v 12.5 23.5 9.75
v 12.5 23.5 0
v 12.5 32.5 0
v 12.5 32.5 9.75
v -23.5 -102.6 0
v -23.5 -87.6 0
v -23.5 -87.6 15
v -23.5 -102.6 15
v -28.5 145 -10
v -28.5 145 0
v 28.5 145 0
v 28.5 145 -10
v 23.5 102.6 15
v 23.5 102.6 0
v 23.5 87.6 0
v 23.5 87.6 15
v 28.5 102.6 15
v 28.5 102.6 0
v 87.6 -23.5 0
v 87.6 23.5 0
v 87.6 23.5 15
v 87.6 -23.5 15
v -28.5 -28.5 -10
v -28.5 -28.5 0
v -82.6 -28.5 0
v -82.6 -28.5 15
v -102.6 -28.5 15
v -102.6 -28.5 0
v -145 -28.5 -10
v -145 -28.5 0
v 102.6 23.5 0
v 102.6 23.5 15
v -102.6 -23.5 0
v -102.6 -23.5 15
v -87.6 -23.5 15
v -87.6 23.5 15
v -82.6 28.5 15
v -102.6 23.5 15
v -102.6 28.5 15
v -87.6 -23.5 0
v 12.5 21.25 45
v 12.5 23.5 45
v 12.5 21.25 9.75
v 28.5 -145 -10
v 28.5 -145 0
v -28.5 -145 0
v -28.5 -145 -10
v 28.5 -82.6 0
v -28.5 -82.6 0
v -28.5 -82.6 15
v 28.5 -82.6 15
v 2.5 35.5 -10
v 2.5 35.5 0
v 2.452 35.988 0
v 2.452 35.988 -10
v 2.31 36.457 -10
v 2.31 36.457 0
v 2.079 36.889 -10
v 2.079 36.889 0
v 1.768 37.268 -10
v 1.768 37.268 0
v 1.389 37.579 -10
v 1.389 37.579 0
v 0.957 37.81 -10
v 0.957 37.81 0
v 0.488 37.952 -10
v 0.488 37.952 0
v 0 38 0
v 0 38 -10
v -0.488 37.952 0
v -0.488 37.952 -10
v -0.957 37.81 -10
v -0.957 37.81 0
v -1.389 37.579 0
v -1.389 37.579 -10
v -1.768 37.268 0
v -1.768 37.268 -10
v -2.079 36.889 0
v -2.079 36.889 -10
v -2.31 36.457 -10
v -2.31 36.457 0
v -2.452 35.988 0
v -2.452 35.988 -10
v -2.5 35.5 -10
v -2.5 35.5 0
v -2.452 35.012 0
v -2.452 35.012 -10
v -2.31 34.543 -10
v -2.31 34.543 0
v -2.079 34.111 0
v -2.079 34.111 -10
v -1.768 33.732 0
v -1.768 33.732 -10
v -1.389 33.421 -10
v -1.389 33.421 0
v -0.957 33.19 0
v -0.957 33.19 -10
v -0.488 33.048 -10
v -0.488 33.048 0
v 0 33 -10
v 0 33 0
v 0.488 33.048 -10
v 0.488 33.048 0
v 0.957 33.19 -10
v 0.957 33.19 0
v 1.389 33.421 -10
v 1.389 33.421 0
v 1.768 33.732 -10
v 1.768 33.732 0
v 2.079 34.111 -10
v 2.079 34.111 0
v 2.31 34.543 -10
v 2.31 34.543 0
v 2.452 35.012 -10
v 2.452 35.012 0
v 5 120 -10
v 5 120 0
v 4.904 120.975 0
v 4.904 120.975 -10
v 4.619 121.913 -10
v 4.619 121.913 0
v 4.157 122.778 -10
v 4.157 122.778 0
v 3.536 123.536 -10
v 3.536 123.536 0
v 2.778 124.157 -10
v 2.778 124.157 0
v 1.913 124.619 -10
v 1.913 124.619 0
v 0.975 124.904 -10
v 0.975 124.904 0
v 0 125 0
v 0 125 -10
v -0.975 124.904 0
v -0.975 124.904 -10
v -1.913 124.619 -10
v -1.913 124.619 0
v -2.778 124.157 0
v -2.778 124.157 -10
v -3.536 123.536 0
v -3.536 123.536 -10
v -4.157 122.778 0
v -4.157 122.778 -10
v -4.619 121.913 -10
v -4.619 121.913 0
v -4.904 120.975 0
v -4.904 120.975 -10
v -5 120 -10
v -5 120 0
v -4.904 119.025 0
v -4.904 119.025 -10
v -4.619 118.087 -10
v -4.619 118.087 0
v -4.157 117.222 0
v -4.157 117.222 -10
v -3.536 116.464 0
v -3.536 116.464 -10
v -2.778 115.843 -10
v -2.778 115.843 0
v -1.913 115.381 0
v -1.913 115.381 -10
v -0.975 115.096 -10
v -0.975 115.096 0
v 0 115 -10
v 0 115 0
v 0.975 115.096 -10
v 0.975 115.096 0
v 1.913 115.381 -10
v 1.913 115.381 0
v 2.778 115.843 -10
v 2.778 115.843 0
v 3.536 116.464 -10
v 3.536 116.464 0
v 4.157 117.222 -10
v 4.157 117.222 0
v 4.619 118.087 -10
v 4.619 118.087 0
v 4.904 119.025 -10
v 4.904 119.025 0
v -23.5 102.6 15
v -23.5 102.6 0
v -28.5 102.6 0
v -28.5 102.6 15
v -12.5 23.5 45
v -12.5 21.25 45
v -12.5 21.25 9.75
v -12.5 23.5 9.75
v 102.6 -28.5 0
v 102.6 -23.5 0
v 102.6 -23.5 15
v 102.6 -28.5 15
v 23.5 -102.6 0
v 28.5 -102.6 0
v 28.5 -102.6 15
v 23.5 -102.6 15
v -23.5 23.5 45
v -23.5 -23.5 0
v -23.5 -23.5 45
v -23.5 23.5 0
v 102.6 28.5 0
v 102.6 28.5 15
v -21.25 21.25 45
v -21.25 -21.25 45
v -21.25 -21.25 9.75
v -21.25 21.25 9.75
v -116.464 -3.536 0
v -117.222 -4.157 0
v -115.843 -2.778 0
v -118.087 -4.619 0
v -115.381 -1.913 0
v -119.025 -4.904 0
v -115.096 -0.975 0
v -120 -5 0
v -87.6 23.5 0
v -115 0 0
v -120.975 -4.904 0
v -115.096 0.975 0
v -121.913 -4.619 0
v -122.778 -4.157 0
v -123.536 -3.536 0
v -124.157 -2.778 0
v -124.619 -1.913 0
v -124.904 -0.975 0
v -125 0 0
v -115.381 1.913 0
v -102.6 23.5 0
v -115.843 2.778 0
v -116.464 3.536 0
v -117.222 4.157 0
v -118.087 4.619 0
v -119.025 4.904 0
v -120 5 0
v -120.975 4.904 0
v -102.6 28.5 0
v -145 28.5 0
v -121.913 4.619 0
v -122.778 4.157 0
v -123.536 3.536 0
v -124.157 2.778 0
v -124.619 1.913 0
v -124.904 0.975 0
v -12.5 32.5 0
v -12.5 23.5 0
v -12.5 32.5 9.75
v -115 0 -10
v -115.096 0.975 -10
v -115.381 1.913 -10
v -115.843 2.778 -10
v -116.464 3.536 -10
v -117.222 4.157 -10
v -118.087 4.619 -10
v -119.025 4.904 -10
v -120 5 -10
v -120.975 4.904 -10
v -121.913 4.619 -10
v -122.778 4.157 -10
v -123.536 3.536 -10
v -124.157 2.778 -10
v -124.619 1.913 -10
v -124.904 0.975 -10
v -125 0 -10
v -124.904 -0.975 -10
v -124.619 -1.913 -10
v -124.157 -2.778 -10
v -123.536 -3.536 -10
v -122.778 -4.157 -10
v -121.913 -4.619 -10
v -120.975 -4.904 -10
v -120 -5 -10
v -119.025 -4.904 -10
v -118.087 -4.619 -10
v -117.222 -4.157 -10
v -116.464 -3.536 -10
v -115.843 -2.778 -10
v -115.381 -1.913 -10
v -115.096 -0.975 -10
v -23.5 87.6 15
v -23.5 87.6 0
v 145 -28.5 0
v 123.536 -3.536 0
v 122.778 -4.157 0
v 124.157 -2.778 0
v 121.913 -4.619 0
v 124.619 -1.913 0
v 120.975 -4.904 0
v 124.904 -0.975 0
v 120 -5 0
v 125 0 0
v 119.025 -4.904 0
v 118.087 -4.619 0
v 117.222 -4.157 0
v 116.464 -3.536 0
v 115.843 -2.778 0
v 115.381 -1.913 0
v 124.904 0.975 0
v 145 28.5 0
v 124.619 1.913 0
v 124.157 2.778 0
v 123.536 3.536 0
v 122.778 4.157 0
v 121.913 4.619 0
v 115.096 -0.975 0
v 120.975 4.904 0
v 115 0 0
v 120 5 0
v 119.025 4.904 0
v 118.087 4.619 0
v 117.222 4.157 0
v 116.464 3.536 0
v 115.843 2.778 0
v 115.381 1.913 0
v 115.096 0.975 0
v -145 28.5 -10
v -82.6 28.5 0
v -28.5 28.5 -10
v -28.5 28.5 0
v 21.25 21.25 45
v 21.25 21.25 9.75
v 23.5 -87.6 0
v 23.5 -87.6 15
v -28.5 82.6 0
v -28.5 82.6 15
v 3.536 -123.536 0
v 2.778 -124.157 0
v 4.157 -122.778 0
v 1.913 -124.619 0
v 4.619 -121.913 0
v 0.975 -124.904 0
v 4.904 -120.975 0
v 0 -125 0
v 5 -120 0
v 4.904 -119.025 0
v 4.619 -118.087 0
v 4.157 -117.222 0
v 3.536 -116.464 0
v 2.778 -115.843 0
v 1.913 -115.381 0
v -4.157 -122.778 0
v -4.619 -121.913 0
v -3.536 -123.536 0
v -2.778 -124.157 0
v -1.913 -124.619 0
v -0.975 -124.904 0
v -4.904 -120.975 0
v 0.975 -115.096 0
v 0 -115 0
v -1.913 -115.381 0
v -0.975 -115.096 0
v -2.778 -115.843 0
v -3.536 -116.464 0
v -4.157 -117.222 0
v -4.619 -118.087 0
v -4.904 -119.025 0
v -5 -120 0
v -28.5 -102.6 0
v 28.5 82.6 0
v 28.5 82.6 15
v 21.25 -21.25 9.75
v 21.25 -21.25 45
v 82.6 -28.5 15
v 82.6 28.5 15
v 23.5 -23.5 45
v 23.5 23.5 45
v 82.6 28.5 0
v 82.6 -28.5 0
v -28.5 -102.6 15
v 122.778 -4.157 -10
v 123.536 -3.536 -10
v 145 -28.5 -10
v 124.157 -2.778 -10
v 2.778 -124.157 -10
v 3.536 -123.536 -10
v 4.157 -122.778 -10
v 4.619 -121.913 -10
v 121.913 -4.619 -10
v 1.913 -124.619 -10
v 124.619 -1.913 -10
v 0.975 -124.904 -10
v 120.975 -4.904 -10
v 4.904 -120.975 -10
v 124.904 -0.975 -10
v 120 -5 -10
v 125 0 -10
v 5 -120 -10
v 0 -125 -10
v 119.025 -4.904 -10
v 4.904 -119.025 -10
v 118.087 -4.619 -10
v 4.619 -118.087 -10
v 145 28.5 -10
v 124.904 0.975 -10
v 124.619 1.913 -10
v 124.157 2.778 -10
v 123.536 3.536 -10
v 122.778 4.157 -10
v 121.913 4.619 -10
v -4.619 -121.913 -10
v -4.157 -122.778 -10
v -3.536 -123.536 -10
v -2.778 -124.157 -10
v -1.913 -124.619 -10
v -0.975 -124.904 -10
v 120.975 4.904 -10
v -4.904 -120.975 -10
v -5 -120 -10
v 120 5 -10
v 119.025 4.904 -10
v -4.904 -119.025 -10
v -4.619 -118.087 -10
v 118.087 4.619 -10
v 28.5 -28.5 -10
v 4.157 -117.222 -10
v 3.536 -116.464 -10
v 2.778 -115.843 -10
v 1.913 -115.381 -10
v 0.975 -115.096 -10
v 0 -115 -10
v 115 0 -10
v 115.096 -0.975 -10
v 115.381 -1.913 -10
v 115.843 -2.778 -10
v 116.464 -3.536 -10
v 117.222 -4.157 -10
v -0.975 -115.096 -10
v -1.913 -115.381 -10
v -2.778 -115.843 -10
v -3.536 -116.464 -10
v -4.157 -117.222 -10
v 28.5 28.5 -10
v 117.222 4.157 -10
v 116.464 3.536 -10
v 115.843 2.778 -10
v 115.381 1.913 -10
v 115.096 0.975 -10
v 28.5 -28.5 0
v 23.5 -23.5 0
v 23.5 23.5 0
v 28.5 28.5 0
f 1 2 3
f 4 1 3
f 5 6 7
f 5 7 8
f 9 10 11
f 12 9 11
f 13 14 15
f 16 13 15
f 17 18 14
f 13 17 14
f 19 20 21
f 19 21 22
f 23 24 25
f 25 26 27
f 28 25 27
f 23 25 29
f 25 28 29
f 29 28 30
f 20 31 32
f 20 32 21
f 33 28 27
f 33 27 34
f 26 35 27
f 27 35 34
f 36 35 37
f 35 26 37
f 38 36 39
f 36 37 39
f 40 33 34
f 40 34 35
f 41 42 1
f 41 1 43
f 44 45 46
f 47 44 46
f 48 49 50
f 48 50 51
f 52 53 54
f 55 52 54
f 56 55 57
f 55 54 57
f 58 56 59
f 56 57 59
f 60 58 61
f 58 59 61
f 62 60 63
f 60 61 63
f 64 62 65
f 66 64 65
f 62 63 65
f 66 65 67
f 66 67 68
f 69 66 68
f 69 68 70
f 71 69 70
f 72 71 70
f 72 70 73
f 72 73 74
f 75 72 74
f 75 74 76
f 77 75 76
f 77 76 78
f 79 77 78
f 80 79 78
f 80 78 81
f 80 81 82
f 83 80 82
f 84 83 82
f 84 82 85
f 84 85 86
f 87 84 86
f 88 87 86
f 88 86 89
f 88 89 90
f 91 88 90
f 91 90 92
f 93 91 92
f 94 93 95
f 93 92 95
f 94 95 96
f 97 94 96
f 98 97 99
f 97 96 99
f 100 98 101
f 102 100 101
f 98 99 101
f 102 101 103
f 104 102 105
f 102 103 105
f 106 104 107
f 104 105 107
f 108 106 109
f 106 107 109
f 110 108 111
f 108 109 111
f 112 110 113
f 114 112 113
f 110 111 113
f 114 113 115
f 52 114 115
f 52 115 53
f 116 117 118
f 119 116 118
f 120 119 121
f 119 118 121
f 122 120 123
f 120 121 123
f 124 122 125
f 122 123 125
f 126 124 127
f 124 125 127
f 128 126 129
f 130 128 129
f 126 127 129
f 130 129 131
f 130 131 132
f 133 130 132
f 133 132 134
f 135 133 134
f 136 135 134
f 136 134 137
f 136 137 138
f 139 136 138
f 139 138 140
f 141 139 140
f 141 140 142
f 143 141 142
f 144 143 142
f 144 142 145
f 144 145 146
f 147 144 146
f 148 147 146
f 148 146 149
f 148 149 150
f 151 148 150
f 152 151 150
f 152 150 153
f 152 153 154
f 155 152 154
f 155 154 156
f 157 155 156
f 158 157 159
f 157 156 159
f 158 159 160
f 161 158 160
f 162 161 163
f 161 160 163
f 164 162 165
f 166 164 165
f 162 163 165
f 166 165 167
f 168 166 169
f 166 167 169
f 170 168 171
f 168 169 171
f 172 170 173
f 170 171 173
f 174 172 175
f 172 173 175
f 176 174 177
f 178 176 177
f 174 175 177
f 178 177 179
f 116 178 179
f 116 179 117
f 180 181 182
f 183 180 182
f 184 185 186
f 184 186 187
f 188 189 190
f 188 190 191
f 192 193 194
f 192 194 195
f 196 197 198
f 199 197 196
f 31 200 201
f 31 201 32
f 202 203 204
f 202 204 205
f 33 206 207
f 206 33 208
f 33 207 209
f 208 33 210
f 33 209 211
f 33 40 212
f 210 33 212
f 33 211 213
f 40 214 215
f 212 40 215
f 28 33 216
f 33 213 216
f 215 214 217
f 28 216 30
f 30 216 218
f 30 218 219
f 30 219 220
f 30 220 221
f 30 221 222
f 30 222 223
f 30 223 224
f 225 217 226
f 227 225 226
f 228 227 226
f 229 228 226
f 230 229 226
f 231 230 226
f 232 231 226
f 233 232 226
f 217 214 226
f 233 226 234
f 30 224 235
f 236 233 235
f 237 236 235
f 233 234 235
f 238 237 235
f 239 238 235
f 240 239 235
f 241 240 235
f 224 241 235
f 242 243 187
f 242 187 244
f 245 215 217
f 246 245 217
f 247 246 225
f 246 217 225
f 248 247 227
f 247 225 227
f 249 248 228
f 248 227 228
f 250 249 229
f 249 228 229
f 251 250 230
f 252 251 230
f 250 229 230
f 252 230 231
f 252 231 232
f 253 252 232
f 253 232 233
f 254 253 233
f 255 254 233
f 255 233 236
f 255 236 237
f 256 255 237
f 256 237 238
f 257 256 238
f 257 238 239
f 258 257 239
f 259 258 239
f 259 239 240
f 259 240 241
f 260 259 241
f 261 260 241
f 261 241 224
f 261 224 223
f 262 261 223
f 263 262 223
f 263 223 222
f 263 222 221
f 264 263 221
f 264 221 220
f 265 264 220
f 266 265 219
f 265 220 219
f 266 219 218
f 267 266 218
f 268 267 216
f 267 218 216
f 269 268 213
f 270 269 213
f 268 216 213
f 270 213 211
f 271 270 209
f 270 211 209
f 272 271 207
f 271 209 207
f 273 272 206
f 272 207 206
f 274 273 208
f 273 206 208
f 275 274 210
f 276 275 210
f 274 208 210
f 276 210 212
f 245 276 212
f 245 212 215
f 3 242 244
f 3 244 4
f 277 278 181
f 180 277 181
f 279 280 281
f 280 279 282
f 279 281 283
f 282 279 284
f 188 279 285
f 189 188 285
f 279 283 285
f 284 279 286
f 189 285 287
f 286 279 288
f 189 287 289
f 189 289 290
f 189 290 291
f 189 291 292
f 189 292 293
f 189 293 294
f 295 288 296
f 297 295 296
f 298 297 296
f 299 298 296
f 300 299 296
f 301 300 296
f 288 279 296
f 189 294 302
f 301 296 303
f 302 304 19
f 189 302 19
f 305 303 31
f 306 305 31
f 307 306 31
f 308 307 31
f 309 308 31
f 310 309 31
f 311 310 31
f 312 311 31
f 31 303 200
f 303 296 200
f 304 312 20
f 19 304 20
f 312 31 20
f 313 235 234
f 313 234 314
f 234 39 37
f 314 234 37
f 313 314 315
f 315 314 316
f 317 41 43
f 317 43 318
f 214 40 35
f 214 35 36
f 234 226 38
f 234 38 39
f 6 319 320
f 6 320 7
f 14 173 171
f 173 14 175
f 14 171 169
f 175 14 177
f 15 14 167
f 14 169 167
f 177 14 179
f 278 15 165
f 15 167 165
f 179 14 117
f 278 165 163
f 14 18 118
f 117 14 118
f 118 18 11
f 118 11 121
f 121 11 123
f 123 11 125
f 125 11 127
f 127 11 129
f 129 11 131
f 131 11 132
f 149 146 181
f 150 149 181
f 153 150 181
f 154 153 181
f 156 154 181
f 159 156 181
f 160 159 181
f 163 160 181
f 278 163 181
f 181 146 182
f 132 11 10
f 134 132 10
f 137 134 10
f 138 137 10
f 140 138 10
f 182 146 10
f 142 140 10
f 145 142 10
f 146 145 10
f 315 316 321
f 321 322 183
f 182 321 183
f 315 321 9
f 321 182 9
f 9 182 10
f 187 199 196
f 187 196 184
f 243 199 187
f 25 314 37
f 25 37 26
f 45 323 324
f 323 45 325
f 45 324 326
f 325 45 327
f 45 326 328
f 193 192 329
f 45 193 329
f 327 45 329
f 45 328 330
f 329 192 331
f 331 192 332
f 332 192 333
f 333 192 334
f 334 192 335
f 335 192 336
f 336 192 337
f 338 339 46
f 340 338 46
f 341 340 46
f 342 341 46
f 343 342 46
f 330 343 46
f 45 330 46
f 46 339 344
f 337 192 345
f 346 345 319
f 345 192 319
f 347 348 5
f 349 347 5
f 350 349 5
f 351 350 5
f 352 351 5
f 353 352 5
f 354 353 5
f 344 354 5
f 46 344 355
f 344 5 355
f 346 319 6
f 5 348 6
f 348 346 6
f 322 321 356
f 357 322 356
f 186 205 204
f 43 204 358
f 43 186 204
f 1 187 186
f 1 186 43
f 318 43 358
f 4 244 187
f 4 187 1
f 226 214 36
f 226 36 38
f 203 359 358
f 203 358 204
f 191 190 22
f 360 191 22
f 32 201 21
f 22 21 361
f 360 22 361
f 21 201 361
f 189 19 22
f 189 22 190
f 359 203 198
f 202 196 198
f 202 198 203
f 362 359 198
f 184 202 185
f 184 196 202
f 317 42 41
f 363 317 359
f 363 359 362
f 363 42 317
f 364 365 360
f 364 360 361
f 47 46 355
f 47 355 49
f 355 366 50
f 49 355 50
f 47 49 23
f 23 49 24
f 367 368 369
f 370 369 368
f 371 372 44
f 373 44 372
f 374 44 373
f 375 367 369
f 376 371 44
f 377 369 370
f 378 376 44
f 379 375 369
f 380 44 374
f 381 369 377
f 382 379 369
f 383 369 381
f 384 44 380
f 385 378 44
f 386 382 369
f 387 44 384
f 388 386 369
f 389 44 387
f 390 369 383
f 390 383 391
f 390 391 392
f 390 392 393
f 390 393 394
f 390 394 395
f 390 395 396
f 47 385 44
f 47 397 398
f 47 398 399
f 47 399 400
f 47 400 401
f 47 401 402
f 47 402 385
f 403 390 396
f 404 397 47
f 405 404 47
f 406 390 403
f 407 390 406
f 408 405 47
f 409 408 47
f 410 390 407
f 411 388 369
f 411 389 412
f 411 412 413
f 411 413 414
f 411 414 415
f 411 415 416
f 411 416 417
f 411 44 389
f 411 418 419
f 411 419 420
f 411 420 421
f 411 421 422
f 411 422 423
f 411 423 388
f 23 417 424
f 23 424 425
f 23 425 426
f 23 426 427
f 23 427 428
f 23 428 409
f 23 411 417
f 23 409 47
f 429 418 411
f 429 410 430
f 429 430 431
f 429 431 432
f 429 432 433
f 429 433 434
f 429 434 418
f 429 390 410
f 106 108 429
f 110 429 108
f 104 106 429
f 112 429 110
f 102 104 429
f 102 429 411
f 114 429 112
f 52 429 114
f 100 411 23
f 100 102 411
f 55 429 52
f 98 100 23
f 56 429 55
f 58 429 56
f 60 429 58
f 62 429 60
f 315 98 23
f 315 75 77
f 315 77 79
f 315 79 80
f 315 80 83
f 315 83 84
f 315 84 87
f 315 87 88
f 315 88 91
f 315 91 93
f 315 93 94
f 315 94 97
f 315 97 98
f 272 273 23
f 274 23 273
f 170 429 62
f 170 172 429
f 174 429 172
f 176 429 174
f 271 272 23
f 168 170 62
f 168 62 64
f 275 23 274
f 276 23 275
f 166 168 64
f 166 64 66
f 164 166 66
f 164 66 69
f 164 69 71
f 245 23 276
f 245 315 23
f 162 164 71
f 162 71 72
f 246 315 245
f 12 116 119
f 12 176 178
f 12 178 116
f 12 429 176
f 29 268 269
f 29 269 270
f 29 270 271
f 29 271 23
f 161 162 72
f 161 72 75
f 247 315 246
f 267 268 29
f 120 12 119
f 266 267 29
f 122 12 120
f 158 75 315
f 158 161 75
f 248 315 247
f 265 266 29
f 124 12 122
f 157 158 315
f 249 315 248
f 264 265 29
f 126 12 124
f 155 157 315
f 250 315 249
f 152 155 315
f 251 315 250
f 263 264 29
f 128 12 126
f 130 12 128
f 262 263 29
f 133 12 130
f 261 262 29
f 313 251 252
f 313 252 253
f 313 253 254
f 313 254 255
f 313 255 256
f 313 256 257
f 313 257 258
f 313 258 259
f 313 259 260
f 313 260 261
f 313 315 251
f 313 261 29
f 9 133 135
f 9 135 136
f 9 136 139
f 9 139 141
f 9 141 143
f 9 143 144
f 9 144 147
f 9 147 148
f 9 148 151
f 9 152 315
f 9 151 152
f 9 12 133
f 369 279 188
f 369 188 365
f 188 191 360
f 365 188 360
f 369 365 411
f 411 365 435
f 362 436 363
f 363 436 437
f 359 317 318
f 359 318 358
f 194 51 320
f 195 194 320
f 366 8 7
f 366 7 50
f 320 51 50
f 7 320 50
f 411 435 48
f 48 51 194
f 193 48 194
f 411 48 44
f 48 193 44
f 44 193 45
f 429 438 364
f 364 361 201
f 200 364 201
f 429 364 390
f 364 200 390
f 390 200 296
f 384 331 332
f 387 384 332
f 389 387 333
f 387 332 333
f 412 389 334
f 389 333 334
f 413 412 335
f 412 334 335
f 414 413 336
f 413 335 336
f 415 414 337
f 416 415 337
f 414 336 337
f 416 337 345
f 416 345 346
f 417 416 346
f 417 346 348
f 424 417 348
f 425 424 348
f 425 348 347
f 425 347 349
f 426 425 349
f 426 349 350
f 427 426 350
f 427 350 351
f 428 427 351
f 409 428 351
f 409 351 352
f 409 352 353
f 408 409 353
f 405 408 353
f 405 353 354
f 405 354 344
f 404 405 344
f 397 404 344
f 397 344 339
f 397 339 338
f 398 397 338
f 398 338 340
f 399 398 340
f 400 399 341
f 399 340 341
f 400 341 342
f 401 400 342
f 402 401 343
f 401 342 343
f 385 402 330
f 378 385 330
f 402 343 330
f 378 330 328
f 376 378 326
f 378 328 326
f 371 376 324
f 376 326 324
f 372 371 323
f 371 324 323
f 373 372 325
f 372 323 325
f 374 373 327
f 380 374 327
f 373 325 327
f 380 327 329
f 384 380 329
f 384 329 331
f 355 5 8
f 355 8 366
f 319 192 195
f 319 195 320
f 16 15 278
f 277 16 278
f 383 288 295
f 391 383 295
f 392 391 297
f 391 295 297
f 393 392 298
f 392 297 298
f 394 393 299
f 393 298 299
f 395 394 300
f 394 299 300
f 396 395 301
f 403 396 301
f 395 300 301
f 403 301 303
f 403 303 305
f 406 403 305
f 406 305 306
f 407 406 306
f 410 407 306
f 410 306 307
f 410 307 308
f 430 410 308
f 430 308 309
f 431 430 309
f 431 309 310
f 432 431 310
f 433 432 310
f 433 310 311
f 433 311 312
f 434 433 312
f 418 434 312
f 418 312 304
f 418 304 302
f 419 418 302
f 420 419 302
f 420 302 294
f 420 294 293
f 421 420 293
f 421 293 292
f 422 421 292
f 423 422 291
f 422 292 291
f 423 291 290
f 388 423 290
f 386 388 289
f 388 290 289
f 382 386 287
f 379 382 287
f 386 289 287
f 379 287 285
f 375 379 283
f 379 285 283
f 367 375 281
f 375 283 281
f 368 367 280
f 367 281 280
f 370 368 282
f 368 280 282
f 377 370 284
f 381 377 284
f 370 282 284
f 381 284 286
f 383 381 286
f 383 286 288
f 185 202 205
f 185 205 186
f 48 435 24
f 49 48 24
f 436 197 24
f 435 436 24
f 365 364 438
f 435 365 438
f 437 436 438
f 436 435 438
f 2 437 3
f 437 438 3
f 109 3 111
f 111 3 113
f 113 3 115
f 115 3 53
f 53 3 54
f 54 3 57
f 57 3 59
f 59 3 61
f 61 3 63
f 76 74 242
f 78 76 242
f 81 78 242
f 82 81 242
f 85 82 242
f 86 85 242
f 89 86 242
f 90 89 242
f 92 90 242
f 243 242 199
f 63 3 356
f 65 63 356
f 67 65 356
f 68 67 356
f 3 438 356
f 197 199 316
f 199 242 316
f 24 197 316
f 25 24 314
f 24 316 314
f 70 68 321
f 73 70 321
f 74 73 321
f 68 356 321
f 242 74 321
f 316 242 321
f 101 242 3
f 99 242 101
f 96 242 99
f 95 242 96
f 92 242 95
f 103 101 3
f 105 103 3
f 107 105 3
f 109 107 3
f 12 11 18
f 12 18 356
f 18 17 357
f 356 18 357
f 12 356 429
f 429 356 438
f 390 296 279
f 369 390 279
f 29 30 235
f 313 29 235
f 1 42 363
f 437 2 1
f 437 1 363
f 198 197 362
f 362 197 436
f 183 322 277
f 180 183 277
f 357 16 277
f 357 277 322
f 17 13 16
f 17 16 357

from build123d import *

# Parameters (mm, degrees)
PAD029_DEPTH    = 10
PAD030_DEPTH    = 15
PAD031_DEPTH    = 15
PAD032_DEPTH    = 15
PAD033_DEPTH    = 15
SKETCH072_R     = 5
POCKET034_DEPTH = 10.001
SKETCH079_W     = 47
SKETCH079_H     = 47
PAD038_DEPTH    = 45
POCKET037_DEPTH = 35.25
SKETCH081_R     = 2.5
POCKET038_DEPTH = 10.001
SKETCH082_W     = 25
SKETCH082_H     = 9
PAD039_DEPTH    = 9.75


with BuildPart() as part:
    # Sketch067 → Pad029 (new body)
    with BuildSketch(Plane.XY):
        Polygon((-145, 28.5), (-28.5, 28.5), (-28.5, 145), (28.5, 145), (28.5, 28.5), (145, 28.5), (145, -28.5), (28.5, -28.5), (28.5, -145), (-28.5, -145), (-28.5, -28.5), (-145, -28.5), align=None)
    extrude(amount=-PAD029_DEPTH)

    # Sketch068 (on Face13 of Pad029) → Pad030 (join)
    with BuildSketch(Plane.XY):
        Polygon((-82.6, 28.5), (-82.6, -28.5), (-102.6, -28.5), (-102.6, -23.5), (-87.6, -23.5), (-87.6, 23.5), (-102.6, 23.5), (-102.6, 28.5), align=None)
    extrude(amount=PAD030_DEPTH)

    # Sketch069 (on Face7 of Pad030) → Pad031 (join)
    with BuildSketch(Plane.XY):
        Polygon((-28.5, 82.6), (28.5, 82.6), (28.5, 102.6), (23.5, 102.6), (23.5, 87.6), (-23.5, 87.6), (-23.5, 102.6), (-28.5, 102.6), align=None)
    extrude(amount=PAD031_DEPTH)

    # Sketch070 (on Face7 of Pad031) → Pad032 (join)
    with BuildSketch(Plane.XY):
        Polygon((82.6, 28.5), (102.6, 28.5), (102.6, 23.5), (87.6, 23.5), (87.6, -23.5), (102.6, -23.5), (102.6, -28.5), (82.6, -28.5), align=None)
    extrude(amount=PAD032_DEPTH)

    # Sketch071 (on Face7 of Pad032) → Pad033 (join)
    with BuildSketch(Plane.XY):
        Polygon((-28.5, -82.6), (28.5, -82.6), (28.5, -102.6), (23.5, -102.6), (23.5, -87.6), (-23.5, -87.6), (-23.5, -102.6), (-28.5, -102.6), align=None)
    extrude(amount=PAD033_DEPTH)

    # Sketch072 (on Face7 of Pad033) → Pocket034 (cut, through all)
    with BuildSketch(Plane.XY):
        with Locations((-120, 0)):
            Circle(SKETCH072_R)
        with Locations((0, 120)):
            Circle(SKETCH072_R)
        with Locations((120, 0)):
            Circle(SKETCH072_R)
        with Locations((0, -120)):
            Circle(SKETCH072_R)
    extrude(amount=-POCKET034_DEPTH, mode=Mode.SUBTRACT)

    # Sketch079 (on Face7 of Pocket034) → Pad038 (join)
    with BuildSketch(Plane.XY):
        Rectangle(SKETCH079_W, SKETCH079_H)
    extrude(amount=PAD038_DEPTH)

    # Sketch080 (on Face53 of Pad038) → Pocket037 (cut)
    with BuildSketch(Plane.XY.offset(45)):
        Polygon((-21.25, 21.25), (-12.5, 21.25), (-12.5, 23.5), (12.5, 23.5), (12.5, 21.25), (21.25, 21.25), (21.25, -21.25), (-21.25, -21.25), align=None)
    extrude(amount=-POCKET037_DEPTH, mode=Mode.SUBTRACT)

    # Sketch081 (on Face7 of Pocket037) → Pocket038 (cut, through all)
    with BuildSketch(Plane.XY):
        with Locations((0, 35.5)):
            Circle(SKETCH081_R)
    extrude(amount=-POCKET038_DEPTH, mode=Mode.SUBTRACT)

    # Sketch082 (on Face7 of Pocket038) → Pad039 (join)
    with BuildSketch(Plane.XY):
        with Locations((0, 28)):
            Rectangle(SKETCH082_W, SKETCH082_H)
    extrude(amount=PAD039_DEPTH)


solid = part.part
